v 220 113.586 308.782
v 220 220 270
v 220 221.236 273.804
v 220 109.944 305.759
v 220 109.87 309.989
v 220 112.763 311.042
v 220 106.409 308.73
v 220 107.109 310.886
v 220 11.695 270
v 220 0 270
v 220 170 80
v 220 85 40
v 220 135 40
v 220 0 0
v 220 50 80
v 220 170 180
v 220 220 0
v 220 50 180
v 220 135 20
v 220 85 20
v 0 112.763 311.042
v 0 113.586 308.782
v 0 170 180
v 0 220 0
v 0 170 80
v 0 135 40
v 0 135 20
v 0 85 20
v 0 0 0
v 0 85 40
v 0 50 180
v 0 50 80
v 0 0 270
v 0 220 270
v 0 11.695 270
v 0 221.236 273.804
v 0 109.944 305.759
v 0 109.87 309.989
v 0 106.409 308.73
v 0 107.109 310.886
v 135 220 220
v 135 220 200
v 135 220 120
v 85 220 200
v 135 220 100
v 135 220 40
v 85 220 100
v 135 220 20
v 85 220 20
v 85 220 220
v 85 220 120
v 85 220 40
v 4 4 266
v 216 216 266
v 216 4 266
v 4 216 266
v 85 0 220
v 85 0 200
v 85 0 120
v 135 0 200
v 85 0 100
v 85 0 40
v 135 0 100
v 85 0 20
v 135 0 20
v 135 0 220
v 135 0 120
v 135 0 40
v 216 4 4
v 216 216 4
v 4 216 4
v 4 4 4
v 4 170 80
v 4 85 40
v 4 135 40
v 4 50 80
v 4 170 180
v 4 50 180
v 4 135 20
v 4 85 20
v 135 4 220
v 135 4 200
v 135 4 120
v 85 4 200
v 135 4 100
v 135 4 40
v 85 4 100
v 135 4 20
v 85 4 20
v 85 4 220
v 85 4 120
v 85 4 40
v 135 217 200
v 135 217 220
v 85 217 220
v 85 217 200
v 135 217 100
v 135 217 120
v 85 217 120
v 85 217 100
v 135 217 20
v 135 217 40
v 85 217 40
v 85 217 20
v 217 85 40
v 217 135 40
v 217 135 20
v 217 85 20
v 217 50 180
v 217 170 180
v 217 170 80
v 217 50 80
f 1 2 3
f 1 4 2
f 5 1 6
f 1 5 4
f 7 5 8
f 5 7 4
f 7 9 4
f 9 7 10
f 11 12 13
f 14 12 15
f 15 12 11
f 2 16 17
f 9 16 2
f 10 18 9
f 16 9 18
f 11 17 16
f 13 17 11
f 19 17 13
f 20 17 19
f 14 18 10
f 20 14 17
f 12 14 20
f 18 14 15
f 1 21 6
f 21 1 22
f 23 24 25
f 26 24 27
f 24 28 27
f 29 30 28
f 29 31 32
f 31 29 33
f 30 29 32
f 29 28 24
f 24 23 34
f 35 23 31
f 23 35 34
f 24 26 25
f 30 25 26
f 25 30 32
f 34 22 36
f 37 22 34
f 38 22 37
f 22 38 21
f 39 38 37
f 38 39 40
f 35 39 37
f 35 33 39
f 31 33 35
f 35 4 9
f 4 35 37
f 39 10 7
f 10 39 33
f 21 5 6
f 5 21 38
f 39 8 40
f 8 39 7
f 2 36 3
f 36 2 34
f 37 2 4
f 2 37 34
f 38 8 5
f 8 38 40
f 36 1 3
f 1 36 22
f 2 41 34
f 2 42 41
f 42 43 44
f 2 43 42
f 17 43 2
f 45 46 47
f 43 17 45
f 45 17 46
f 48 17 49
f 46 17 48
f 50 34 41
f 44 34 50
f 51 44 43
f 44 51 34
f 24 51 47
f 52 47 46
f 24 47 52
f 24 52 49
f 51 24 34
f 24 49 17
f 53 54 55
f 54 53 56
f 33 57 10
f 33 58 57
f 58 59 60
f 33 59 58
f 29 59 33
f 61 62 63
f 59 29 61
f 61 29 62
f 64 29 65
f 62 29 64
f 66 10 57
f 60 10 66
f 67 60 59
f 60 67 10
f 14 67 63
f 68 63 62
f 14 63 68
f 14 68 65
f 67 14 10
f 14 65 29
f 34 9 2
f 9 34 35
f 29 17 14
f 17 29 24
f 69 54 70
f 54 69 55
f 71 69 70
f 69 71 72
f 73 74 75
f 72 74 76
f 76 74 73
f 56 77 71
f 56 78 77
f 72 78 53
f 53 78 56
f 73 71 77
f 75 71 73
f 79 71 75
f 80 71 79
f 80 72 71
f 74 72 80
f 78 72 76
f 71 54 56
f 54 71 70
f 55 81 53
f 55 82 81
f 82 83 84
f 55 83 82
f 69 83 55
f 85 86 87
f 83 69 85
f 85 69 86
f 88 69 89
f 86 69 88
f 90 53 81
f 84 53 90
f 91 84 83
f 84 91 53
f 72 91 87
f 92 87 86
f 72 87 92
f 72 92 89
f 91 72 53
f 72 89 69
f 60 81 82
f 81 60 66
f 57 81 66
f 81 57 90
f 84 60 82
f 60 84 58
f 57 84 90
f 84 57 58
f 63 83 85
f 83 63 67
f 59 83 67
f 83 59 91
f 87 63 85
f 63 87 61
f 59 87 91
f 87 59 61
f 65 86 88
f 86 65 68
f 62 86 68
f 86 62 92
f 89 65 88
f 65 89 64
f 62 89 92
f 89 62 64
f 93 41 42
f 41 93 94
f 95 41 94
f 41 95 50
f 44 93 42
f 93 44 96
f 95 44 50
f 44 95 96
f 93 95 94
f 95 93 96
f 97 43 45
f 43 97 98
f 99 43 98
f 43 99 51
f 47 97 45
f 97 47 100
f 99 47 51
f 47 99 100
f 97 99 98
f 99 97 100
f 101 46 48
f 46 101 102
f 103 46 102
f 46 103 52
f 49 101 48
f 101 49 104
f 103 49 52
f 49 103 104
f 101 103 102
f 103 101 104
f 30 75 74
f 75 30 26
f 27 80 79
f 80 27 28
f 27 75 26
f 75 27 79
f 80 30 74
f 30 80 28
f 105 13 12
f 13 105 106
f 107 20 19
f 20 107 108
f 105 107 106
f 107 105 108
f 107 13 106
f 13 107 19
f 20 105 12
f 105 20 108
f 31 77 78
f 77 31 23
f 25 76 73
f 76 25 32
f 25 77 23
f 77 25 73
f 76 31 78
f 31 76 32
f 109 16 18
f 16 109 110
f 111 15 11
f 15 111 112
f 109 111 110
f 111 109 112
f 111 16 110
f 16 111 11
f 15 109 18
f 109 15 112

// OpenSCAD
$fn = 100;

//mesures
largeur = 220;
profondeur = 220;
hauteur = 270;
epaisseur = 4;

//fenêtres
fenetreL = 120;
fenetreH = 100;
fenetreEp = 4;

//trou
entreeL = 50;
entreeH = 20;
union()
{
    translate([0,0,hauteur])
    {
        rotate([-70,0,0])
        cube([largeur, 4, 120]);

        translate([0,largeur,0])
        rotate([72,0,0])
        cube([largeur, 4, 120]);

        rotate([-90,0,0])
        cube([largeur, 4, largeur]);
    }
}
union()
{
    //corps
    difference()
    {
        //boîte
        cube([largeur,profondeur,hauteur]);
        
        //partie enlevée
        translate([epaisseur, epaisseur, epaisseur])
        cube([largeur-2*epaisseur, profondeur-2*epaisseur, hauteur]);
        
        //trou
        translate([largeur/2 - entreeL/2, -1, 200])
        cube([entreeL, epaisseur+2, entreeH]);
        
        translate([largeur/2 - entreeL/2, -1, 100])
        cube([entreeL, epaisseur+2, entreeH]);
        
        translate([largeur/2 - entreeL/2, -1, 20])
        cube([entreeL, epaisseur+2, entreeH]);
        
        translate([largeur/2 - entreeL/2, profondeur - epaisseur + 1, 200])
        cube([entreeL, epaisseur+5, entreeH]);
        
        translate([largeur/2 - entreeL/2, profondeur - epaisseur + 1, 100])
        cube([entreeL, epaisseur+5, entreeH]);
        
        translate([largeur/2 - entreeL/2, profondeur - epaisseur + 1, 20])
        cube([entreeL, epaisseur+5, entreeH]);
        
        translate([-1, profondeur/2 - entreeL/2, 20])
        cube([epaisseur+2, entreeL, entreeH]);  
        
        translate([largeur - epaisseur + 1, profondeur/2 - entreeL/2, 20])
        cube([epaisseur+5, entreeL, entreeH]);
        
        //deux fenetres
        translate([-1, profondeur/2 - fenetreL/2, 80])
        cube([epaisseur+2, fenetreL, fenetreH]);
        
        translate([largeur - epaisseur + 1, profondeur/2 - fenetreL/2, 80])
        cube([epaisseur + 5, fenetreL, fenetreH]);
    }
    
    //cadres des fenetres
}
